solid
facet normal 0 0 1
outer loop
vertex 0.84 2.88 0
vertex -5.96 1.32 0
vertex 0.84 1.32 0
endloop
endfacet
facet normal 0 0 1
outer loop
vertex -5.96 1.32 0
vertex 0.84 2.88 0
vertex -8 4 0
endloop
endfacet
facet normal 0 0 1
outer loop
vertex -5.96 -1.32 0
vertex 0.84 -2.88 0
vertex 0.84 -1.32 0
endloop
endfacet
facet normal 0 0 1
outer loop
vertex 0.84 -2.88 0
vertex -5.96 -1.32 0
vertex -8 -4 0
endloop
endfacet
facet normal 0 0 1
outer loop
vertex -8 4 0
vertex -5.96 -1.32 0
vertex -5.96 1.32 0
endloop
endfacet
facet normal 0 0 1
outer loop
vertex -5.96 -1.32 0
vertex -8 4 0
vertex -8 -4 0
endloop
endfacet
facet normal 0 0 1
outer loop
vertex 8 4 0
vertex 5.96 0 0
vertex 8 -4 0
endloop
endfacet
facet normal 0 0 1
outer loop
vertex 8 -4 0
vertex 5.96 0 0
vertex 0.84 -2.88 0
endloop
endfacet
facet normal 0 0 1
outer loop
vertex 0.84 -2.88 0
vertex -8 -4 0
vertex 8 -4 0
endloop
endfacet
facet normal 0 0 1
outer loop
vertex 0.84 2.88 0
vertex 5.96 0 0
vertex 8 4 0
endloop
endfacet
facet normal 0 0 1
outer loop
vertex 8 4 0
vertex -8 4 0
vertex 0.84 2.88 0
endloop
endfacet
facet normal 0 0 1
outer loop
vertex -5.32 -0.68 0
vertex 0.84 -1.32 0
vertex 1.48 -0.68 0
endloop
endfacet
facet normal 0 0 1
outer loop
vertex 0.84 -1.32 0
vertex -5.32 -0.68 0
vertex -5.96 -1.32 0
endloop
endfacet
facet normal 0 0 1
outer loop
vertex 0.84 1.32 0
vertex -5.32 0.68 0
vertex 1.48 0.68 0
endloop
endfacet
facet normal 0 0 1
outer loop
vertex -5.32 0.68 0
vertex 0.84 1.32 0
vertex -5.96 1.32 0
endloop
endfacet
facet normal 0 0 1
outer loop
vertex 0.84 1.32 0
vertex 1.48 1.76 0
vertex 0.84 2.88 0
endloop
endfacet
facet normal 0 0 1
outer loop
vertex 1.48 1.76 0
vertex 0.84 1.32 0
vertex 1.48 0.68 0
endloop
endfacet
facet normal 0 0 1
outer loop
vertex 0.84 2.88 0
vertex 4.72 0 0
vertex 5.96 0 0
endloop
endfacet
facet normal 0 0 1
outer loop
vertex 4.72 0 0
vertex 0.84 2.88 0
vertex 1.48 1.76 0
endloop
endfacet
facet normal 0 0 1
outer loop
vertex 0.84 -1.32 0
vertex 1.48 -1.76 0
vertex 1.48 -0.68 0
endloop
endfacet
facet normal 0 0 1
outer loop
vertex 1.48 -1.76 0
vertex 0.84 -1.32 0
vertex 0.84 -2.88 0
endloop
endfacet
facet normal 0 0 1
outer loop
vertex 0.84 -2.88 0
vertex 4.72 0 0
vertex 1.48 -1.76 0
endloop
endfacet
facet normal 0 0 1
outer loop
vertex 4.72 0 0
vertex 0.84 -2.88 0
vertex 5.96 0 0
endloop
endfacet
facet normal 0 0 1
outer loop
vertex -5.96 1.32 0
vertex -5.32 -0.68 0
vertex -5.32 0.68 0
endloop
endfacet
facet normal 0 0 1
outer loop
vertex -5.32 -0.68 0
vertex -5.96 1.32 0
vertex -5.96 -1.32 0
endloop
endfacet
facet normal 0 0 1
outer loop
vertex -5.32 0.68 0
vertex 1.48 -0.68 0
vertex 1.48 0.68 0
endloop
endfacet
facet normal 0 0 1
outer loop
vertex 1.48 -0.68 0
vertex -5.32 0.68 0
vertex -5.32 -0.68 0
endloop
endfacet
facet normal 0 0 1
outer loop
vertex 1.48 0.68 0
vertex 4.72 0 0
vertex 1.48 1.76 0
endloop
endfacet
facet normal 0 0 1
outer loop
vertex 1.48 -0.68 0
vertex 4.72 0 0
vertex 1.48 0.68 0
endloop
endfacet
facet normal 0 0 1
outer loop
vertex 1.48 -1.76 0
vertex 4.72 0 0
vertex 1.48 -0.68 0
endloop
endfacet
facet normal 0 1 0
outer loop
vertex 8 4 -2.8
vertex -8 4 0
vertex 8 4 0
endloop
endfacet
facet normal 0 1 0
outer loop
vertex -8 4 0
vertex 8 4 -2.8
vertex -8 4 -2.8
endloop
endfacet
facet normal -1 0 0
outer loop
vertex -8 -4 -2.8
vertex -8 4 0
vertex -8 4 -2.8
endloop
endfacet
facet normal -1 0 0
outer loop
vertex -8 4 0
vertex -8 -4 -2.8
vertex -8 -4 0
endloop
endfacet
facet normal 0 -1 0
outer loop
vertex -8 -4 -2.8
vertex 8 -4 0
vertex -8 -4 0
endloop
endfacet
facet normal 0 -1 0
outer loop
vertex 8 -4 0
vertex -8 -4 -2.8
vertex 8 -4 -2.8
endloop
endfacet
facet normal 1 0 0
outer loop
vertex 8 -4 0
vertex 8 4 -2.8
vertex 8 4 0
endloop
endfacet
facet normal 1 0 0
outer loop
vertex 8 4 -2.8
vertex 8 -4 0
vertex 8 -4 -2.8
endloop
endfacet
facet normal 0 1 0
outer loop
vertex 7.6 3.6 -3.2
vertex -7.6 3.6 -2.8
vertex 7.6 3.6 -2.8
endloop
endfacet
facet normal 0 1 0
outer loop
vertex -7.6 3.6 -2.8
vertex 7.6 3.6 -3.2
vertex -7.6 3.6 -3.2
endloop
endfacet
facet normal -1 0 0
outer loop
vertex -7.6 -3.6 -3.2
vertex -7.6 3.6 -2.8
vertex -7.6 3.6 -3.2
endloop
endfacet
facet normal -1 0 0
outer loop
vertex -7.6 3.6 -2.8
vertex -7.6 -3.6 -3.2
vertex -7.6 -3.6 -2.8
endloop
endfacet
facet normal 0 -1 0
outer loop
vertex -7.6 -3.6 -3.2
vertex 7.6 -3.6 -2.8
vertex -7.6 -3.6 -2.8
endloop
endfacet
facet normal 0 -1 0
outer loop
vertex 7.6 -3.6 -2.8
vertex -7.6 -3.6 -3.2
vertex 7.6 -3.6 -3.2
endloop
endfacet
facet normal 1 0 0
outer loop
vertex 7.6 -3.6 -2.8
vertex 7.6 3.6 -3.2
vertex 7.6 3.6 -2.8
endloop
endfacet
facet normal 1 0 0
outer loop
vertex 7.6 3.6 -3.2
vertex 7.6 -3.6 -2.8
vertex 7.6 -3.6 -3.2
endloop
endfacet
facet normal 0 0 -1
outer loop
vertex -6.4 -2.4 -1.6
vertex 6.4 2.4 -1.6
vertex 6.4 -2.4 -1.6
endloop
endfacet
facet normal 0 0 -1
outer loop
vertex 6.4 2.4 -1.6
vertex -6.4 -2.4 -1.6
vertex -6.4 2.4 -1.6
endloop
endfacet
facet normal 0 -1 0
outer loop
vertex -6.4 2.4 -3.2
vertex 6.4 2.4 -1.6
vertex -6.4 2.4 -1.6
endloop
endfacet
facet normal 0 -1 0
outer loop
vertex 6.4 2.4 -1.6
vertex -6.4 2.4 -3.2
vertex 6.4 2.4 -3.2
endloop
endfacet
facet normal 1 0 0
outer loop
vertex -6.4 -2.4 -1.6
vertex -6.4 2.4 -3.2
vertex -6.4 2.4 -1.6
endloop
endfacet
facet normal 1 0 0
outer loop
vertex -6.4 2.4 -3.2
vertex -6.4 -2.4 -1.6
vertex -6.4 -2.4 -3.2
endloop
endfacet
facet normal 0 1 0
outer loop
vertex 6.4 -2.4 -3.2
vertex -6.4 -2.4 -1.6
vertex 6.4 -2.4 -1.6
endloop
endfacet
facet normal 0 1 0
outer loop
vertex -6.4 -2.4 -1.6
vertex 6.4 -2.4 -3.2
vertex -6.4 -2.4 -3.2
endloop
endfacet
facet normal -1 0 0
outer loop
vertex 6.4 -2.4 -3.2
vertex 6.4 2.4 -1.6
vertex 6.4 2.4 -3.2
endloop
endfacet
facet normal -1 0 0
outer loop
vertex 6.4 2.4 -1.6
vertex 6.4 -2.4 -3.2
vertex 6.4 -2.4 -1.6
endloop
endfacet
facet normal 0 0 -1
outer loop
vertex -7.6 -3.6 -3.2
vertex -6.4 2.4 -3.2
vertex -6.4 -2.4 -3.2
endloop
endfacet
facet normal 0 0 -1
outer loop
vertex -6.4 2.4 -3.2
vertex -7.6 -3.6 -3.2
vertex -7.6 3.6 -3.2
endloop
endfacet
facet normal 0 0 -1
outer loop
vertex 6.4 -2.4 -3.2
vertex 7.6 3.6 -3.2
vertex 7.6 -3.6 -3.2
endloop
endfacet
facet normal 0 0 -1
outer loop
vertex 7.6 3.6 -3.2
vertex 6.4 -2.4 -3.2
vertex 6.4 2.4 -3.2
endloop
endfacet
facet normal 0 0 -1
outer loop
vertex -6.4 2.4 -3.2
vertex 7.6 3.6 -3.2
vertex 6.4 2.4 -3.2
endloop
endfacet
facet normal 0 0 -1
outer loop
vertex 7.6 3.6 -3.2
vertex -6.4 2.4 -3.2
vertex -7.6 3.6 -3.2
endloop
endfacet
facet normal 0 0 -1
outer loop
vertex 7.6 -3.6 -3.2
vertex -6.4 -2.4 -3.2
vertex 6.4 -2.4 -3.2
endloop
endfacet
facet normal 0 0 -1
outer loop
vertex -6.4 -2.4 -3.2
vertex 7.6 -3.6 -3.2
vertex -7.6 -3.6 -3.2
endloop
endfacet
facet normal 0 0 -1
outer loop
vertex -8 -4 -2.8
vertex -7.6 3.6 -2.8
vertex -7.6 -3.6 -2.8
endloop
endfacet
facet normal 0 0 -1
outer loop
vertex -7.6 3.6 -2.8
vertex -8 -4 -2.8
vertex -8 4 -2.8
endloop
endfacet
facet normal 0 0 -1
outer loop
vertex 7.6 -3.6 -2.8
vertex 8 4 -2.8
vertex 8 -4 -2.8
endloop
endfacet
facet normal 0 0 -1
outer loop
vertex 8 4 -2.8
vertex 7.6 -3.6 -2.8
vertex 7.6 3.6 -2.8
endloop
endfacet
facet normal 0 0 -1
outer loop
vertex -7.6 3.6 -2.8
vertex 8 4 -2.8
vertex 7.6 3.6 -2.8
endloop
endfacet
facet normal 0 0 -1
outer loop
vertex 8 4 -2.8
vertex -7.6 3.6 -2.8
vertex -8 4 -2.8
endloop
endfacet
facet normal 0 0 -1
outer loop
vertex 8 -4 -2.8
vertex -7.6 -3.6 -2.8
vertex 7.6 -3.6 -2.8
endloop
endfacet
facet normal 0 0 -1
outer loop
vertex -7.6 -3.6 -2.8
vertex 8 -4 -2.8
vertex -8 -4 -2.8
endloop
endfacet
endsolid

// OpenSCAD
// file: ../p/box5.scad
use <../lib.scad>
function ldraw_lib__box5() = [
// 0 Box with 5 Faces and All Edges
// 0 Name: box5.dat
// 0 Author: James Jessiman
// 0 !LDRAW_ORG Primitive UPDATE 2012-01
// 0 !LICENSE Licensed under CC BY 2.0 and CC BY 4.0 : see CAreadme.txt
// 
// 0 BFC CERTIFY CCW
  [0,"BFC","CERTIFY"],
  [0,"BFC","CCW"],
// 
// 0 !HISTORY 2002-04-03 [sbliss] Modified for BFC compliance
// 0 !HISTORY 2002-04-25 [PTadmin] Official Update 2002-02
// 0 !HISTORY 2007-06-24 [PTadmin] Header formatted for Contributor Agreement
// 0 !HISTORY 2008-07-01 [PTadmin] Official Update 2008-01
// 0 !HISTORY 2012-02-16 [Philo] Changed to CCW
// 0 !HISTORY 2012-03-30 [PTadmin] Official Update 2012-01
// 
// 
// 2 24 1 1 1 -1 1 1
  [2,24,1,1,1,-1,1,1],
// 2 24 -1 1 1 -1 1 -1
  [2,24,-1,1,1,-1,1,-1],
// 2 24 -1 1 -1 1 1 -1
  [2,24,-1,1,-1,1,1,-1],
// 2 24 1 1 -1 1 1 1
  [2,24,1,1,-1,1,1,1],
// 2 24 1 0 1 -1 0 1
  [2,24,1,0,1,-1,0,1],
// 2 24 -1 0 1 -1 0 -1
  [2,24,-1,0,1,-1,0,-1],
// 2 24 -1 0 -1 1 0 -1
  [2,24,-1,0,-1,1,0,-1],
// 2 24 1 0 -1 1 0 1
  [2,24,1,0,-1,1,0,1],
// 2 24 1 0 1 1 1 1
  [2,24,1,0,1,1,1,1],
// 2 24 -1 0 1 -1 1 1
  [2,24,-1,0,1,-1,1,1],
// 2 24 1 0 -1 1 1 -1
  [2,24,1,0,-1,1,1,-1],
// 2 24 -1 0 -1 -1 1 -1
  [2,24,-1,0,-1,-1,1,-1],
// 4 16 -1 1 1 1 1 1 1 1 -1 -1 1 -1
  [4,16,-1,1,1,1,1,1,1,1,-1,-1,1,-1],
// 4 16 -1 1 1 -1 0 1 1 0 1 1 1 1
  [4,16,-1,1,1,-1,0,1,1,0,1,1,1,1],
// 4 16 -1 1 -1 -1 0 -1 -1 0 1 -1 1 1
  [4,16,-1,1,-1,-1,0,-1,-1,0,1,-1,1,1],
// 4 16 1 1 -1 1 0 -1 -1 0 -1 -1 1 -1
  [4,16,1,1,-1,1,0,-1,-1,0,-1,-1,1,-1],
// 4 16 1 1 1 1 0 1 1 0 -1 1 1 -1
  [4,16,1,1,1,1,0,1,1,0,-1,1,1,-1],
];
makepoly(ldraw_lib__box5(), line=0.2);
// file: ../p/box4.scad
use <../lib.scad>
function ldraw_lib__box4() = [
// 0 Box with 4 Faces (2 Parallel Pairs) and All Edges
// 0 Name: box4.dat
// 0 Author: James Jessiman
// 0 !LDRAW_ORG Primitive UPDATE 2012-01
// 0 !LICENSE Licensed under CC BY 2.0 and CC BY 4.0 : see CAreadme.txt
// 
// 0 BFC CERTIFY CCW
  [0,"BFC","CERTIFY"],
  [0,"BFC","CCW"],
// 
// 0 !HISTORY 2002-04-03 [sbliss] Modified for BFC compliance
// 0 !HISTORY 2002-04-25 [PTadmin] Official Update 2002-02
// 0 !HISTORY 2007-06-24 [PTadmin] Header formatted for Contributor Agreement
// 0 !HISTORY 2008-07-01 [PTadmin] Official Update 2008-01
// 0 !HISTORY 2012-02-16 [Philo] Changed to CCW
// 0 !HISTORY 2012-03-30 [PTadmin] Official Update 2012-01
// 
// 
// 2 24 1 1 1 -1 1 1
  [2,24,1,1,1,-1,1,1],
// 2 24 -1 1 1 -1 1 -1
  [2,24,-1,1,1,-1,1,-1],
// 2 24 -1 1 -1 1 1 -1
  [2,24,-1,1,-1,1,1,-1],
// 2 24 1 1 -1 1 1 1
  [2,24,1,1,-1,1,1,1],
// 2 24 1 0 1 -1 0 1
  [2,24,1,0,1,-1,0,1],
// 2 24 -1 0 1 -1 0 -1
  [2,24,-1,0,1,-1,0,-1],
// 2 24 -1 0 -1 1 0 -1
  [2,24,-1,0,-1,1,0,-1],
// 2 24 1 0 -1 1 0 1
  [2,24,1,0,-1,1,0,1],
// 2 24 1 0 1 1 1 1
  [2,24,1,0,1,1,1,1],
// 2 24 -1 0 1 -1 1 1
  [2,24,-1,0,1,-1,1,1],
// 2 24 1 0 -1 1 1 -1
  [2,24,1,0,-1,1,1,-1],
// 2 24 -1 0 -1 -1 1 -1
  [2,24,-1,0,-1,-1,1,-1],
// 4 16 -1 1 1 -1 0 1 1 0 1 1 1 1
  [4,16,-1,1,1,-1,0,1,1,0,1,1,1,1],
// 4 16 -1 1 -1 -1 0 -1 -1 0 1 -1 1 1
  [4,16,-1,1,-1,-1,0,-1,-1,0,1,-1,1,1],
// 4 16 1 1 -1 1 0 -1 -1 0 -1 -1 1 -1
  [4,16,1,1,-1,1,0,-1,-1,0,-1,-1,1,-1],
// 4 16 1 1 1 1 0 1 1 0 -1 1 1 -1
  [4,16,1,1,1,1,0,1,1,0,-1,1,1,-1],
];
makepoly(ldraw_lib__box4(), line=0.2);
// file: s/3069p06c.scad
use <../../lib.scad>
function ldraw_lib__s__3069p06c() = [
// 0 ~Tile  1 x  2 with Arrow Long Pattern (Arrow)
// 0 Name: s\3069p06c.dat
// 0 Author: William Howard [WilliamH]
// 0 !LDRAW_ORG Subpart UPDATE 2009-03
// 0 !LICENSE Licensed under CC BY 2.0 and CC BY 4.0 : see CAreadme.txt
// 
// 0 BFC CERTIFY CCW
  [0,"BFC","CERTIFY"],
  [0,"BFC","CCW"],
// 
// 0 !HISTORY 2009-05-02 [PTadmin] Official Update 2009-01
// 0 !HISTORY 2009-08-18 [anathema] Improved pattern
// 0 !HISTORY 2009-12-29 [PTadmin] Official Update 2009-03
// 
// 
// 4 16 -13.3 0 -1.7 3.7 0 -1.7 3.7 0 1.7 -13.3 0 1.7
  [4,16,-13.3,0,-1.7,3.7,0,-1.7,3.7,0,1.7,-13.3,0,1.7],
// 3 16 3.7 0 1.7 11.8 0 0 3.7 0 4.4
  [3,16,3.7,0,1.7,11.8,0,0,3.7,0,4.4],
// 3 16 3.7 0 -1.7 11.8 0 0 3.7 0 1.7
  [3,16,3.7,0,-1.7,11.8,0,0,3.7,0,1.7],
// 3 16 3.7 0 -4.4 11.8 0 0 3.7 0 -1.7
  [3,16,3.7,0,-4.4,11.8,0,0,3.7,0,-1.7],
// 0
];
makepoly(ldraw_lib__s__3069p06c(), line=0.2);
// file: s/3069p06b.scad
use <../../lib.scad>
function ldraw_lib__s__3069p06b() = [
// 0 ~Tile  1 x  2 with Arrow Long Pattern (Border)
// 0 Name: s\3069p06b.dat
// 0 Author: William Howard [WilliamH]
// 0 !LDRAW_ORG Subpart UPDATE 2009-03
// 0 !LICENSE Licensed under CC BY 2.0 and CC BY 4.0 : see CAreadme.txt
// 
// 0 BFC CERTIFY CCW
  [0,"BFC","CERTIFY"],
  [0,"BFC","CCW"],
// 
// 0 !HISTORY 2009-05-02 [PTadmin] Official Update 2009-01
// 0 !HISTORY 2009-08-18 [anathema] Improved pattern
// 0 !HISTORY 2009-10-09 [cwdee] Corrected small overlap
// 0 !HISTORY 2009-12-29 [PTadmin] Official Update 2009-03
// 
// 
// 4 16 -14.9 0 -3.3 2.1 0 -3.3 3.7 0 -1.7 -13.3 0 -1.7
  [4,16,-14.9,0,-3.3,2.1,0,-3.3,3.7,0,-1.7,-13.3,0,-1.7],
// 4 16 -13.3 0 1.7 3.7 0 1.7 2.1 0 3.3 -14.9 0 3.3
  [4,16,-13.3,0,1.7,3.7,0,1.7,2.1,0,3.3,-14.9,0,3.3],
// 4 16 2.1 0 7.2 2.1 0 3.3 3.7 0 1.7 3.7 0 4.4
  [4,16,2.1,0,7.2,2.1,0,3.3,3.7,0,1.7,3.7,0,4.4],
// 4 16 3.7 0 4.4 11.8 0 0 14.9 0 0 2.1 0 7.2
  [4,16,3.7,0,4.4,11.8,0,0,14.9,0,0,2.1,0,7.2],
// 4 16 3.7 0 -4.4 3.7 0 -1.7 2.1 0 -3.3 2.1 0 -7.2
  [4,16,3.7,0,-4.4,3.7,0,-1.7,2.1,0,-3.3,2.1,0,-7.2],
// 4 16 2.1 0 -7.2 14.9 0 0 11.8 0 0 3.7 0 -4.4
  [4,16,2.1,0,-7.2,14.9,0,0,11.8,0,0,3.7,0,-4.4],
// 4 16 -14.9 0 3.3 -14.9 0 -3.3 -13.3 0 -1.7 -13.3 0 1.7
  [4,16,-14.9,0,3.3,-14.9,0,-3.3,-13.3,0,-1.7,-13.3,0,1.7],
// 0
];
makepoly(ldraw_lib__s__3069p06b(), line=0.2);
// file: s/3069p06a.scad
use <../../lib.scad>
function ldraw_lib__s__3069p06a() = [
// 0 ~Tile  1 x  2 with Arrow Long Pattern (Mask)
// 0 Name: s\3069p06a.dat
// 0 Author: William Howard [WilliamH]
// 0 !LDRAW_ORG Subpart UPDATE 2009-03
// 0 !LICENSE Licensed under CC BY 2.0 and CC BY 4.0 : see CAreadme.txt
// 
// 0 BFC CERTIFY CCW
  [0,"BFC","CERTIFY"],
  [0,"BFC","CCW"],
// 
// 0 !HISTORY 2009-05-02 [PTadmin] Official Update 2009-01
// 0 !HISTORY 2009-08-18 [anathema] Improved pattern
// 0 !HISTORY 2009-12-29 [PTadmin] Official Update 2009-03
// 
// 
// 4 16 -14.9 0 3.3 2.1 0 3.3 2.1 0 7.2 -20 0 10
  [4,16,-14.9,0,3.3,2.1,0,3.3,2.1,0,7.2,-20,0,10],
// 4 16 -20 0 -10 2.1 0 -7.2 2.1 0 -3.3 -14.9 0 -3.3
  [4,16,-20,0,-10,2.1,0,-7.2,2.1,0,-3.3,-14.9,0,-3.3],
// 4 16 -20 0 10 -20 0 -10 -14.9 0 -3.3 -14.9 0 3.3
  [4,16,-20,0,10,-20,0,-10,-14.9,0,-3.3,-14.9,0,3.3],
// 3 16 20 0 10 14.9 0 0 20 0 -10
  [3,16,20,0,10,14.9,0,0,20,0,-10],
// 3 16 20 0 -10 14.9 0 0 2.1 0 -7.2
  [3,16,20,0,-10,14.9,0,0,2.1,0,-7.2],
// 3 16 2.1 0 -7.2 -20 0 -10 20 0 -10
  [3,16,2.1,0,-7.2,-20,0,-10,20,0,-10],
// 3 16 2.1 0 7.2 14.9 0 0 20 0 10
  [3,16,2.1,0,7.2,14.9,0,0,20,0,10],
// 3 16 20 0 10 -20 0 10 2.1 0 7.2
  [3,16,20,0,10,-20,0,10,2.1,0,7.2],
// 0
];
makepoly(ldraw_lib__s__3069p06a(), line=0.2);
// file: s/3069bs01.scad
use <../../lib.scad>
use <../../p/box4.scad>
use <../../p/box5.scad>
function ldraw_lib__s__3069bs01() = [
// 0 ~Tile  1 x  2 with Groove without Top Face
// 0 Name: s\3069bs01.dat
// 0 Author: Santeri Piippo [arezey]
// 0 !LDRAW_ORG Subpart UPDATE 2010-02
// 0 !LICENSE Licensed under CC BY 2.0 and CC BY 4.0 : see CAreadme.txt
// 
// 0 BFC CERTIFY CCW
  [0,"BFC","CERTIFY"],
  [0,"BFC","CCW"],
// 
// 0 !HISTORY 2010-07-05 [PTadmin] Official Update 2010-02
// 
// 
// 1 16 0 0 0 20 0 0 0 7 0 0 0 10 box4.dat
  [1,16,0,0,0,20,0,0,0,7,0,0,0,10, ldraw_lib__box4()],
// 1 16 0 7 0 19 0 0 0 1 0 0 0 9 box4.dat
  [1,16,0,7,0,19,0,0,0,1,0,0,0,9, ldraw_lib__box4()],
// 0 BFC INVERTNEXT
  [0,"BFC","INVERTNEXT"],
// 1 16 0 8 0 16 0 0 0 -4 0 0 0 6 box5.dat
  [1,16,0,8,0,16,0,0,0,-4,0,0,0,6, ldraw_lib__box5()],
// 4 16 -19 8 9 -16 8 6 -16 8 -6 -19 8 -9
  [4,16,-19,8,9,-16,8,6,-16,8,-6,-19,8,-9],
// 4 16 19 8 -9 16 8 -6 16 8 6 19 8 9
  [4,16,19,8,-9,16,8,-6,16,8,6,19,8,9],
// 4 16 19 8 9 16 8 6 -16 8 6 -19 8 9
  [4,16,19,8,9,16,8,6,-16,8,6,-19,8,9],
// 4 16 -19 8 -9 -16 8 -6 16 8 -6 19 8 -9
  [4,16,-19,8,-9,-16,8,-6,16,8,-6,19,8,-9],
// 4 16 -20 7 10 -19 7 9 -19 7 -9 -20 7 -10
  [4,16,-20,7,10,-19,7,9,-19,7,-9,-20,7,-10],
// 4 16 20 7 -10 19 7 -9 19 7 9 20 7 10
  [4,16,20,7,-10,19,7,-9,19,7,9,20,7,10],
// 4 16 20 7 10 19 7 9 -19 7 9 -20 7 10
  [4,16,20,7,10,19,7,9,-19,7,9,-20,7,10],
// 4 16 -20 7 -10 -19 7 -9 19 7 -9 20 7 -10
  [4,16,-20,7,-10,-19,7,-9,19,7,-9,20,7,-10],
// 0 //
];
makepoly(ldraw_lib__s__3069bs01(), line=0.2);
// file: 3069bp06.scad
use <../lib.scad>
use <s/3069bs01.scad>
use <s/3069p06a.scad>
use <s/3069p06b.scad>
use <s/3069p06c.scad>
function ldraw_lib__3069bp06() = [
// 0 Tile  1 x  2 with Arrow Long Yellow with Black Border Pattern
// 0 Name: 3069bp06.dat
// 0 Author: James Jessiman
// 0 !LDRAW_ORG Part UPDATE 2009-03
// 0 !LICENSE Licensed under CC BY 2.0 and CC BY 4.0 : see CAreadme.txt
// 
// 0 BFC CERTIFY CCW
  [0,"BFC","CERTIFY"],
  [0,"BFC","CCW"],
// 
// 0 !HISTORY 2002-01-17 {Bram Lambrecht} improved version
// 0 !HISTORY 2002-02-18 [PTadmin] Official Update 2002-01
// 0 !HISTORY 2003-06-08 [jriley] BFC compliant
// 0 !HISTORY 2003-12-19 [PTadmin] Official Update 2003-03
// 0 !HISTORY 2007-06-13 [PTadmin] Header formatted for Contributor Agreement
// 0 !HISTORY 2008-07-01 [PTadmin] Official Update 2008-01
// 0 !HISTORY 2008-07-07 [WilliamH] Sub-parted
// 0 !HISTORY 2008-12-16 [anathema] Reinstated missing subpart
// 0 !HISTORY 2009-05-02 [PTadmin] Official Update 2009-01
// 0 !HISTORY 2009-08-19 [anathema] Changed description
// 0 !HISTORY 2009-12-29 [PTadmin] Official Update 2009-03
// 
// 
// 1 16 0 0 0 1 0 0 0 1 0 0 0 1 s\3069p06a.dat
  [1,16,0,0,0,1,0,0,0,1,0,0,0,1, ldraw_lib__s__3069p06a()],
// 1 0 0 0 0 1 0 0 0 1 0 0 0 1 s\3069p06b.dat
  [1,0,0,0,0,1,0,0,0,1,0,0,0,1, ldraw_lib__s__3069p06b()],
// 1 14 0 0 0 1 0 0 0 1 0 0 0 1 s\3069p06c.dat
  [1,14,0,0,0,1,0,0,0,1,0,0,0,1, ldraw_lib__s__3069p06c()],
// 1 16 0 0 0 1 0 0 0 1 0 0 0 1 s\3069bs01.dat
  [1,16,0,0,0,1,0,0,0,1,0,0,0,1, ldraw_lib__s__3069bs01()],
// 0
];
makepoly(ldraw_lib__3069bp06(), line=0.2);
// main file
use <../lib.scad>
use <3069bp06.scad>
function ldraw_lib__3069p06() = [
// 0 ~Moved to 3069bp06
// 0 Name: 3069p06.dat
// 0 Author: [PTadmin]
// 0 !LDRAW_ORG Part UPDATE 2002-01
// 0 !LICENSE Licensed under CC BY 4.0 : see CAreadme.txt
// 
// 0 BFC CERTIFY CCW
  [0,"BFC","CERTIFY"],
  [0,"BFC","CCW"],
// 
// 0 !HISTORY 1999-02-01 [PTadmin] Official Update 1999-01
// 0 !HISTORY 2002-02-18 [PTadmin] Official Update 2002-01
// 0 !HISTORY 2007-06-13 [PTadmin] Header formatted for Contributor Agreement
// 0 !HISTORY 2008-07-01 [PTadmin] Official Update 2008-01
// 
// 
// 1 16 0 0 0 1 0 0 0 1 0 0 0 1 3069bp06.dat
  [1,16,0,0,0,1,0,0,0,1,0,0,0,1, ldraw_lib__3069bp06()],
];
makepoly(ldraw_lib__3069p06(), line=0.2);
